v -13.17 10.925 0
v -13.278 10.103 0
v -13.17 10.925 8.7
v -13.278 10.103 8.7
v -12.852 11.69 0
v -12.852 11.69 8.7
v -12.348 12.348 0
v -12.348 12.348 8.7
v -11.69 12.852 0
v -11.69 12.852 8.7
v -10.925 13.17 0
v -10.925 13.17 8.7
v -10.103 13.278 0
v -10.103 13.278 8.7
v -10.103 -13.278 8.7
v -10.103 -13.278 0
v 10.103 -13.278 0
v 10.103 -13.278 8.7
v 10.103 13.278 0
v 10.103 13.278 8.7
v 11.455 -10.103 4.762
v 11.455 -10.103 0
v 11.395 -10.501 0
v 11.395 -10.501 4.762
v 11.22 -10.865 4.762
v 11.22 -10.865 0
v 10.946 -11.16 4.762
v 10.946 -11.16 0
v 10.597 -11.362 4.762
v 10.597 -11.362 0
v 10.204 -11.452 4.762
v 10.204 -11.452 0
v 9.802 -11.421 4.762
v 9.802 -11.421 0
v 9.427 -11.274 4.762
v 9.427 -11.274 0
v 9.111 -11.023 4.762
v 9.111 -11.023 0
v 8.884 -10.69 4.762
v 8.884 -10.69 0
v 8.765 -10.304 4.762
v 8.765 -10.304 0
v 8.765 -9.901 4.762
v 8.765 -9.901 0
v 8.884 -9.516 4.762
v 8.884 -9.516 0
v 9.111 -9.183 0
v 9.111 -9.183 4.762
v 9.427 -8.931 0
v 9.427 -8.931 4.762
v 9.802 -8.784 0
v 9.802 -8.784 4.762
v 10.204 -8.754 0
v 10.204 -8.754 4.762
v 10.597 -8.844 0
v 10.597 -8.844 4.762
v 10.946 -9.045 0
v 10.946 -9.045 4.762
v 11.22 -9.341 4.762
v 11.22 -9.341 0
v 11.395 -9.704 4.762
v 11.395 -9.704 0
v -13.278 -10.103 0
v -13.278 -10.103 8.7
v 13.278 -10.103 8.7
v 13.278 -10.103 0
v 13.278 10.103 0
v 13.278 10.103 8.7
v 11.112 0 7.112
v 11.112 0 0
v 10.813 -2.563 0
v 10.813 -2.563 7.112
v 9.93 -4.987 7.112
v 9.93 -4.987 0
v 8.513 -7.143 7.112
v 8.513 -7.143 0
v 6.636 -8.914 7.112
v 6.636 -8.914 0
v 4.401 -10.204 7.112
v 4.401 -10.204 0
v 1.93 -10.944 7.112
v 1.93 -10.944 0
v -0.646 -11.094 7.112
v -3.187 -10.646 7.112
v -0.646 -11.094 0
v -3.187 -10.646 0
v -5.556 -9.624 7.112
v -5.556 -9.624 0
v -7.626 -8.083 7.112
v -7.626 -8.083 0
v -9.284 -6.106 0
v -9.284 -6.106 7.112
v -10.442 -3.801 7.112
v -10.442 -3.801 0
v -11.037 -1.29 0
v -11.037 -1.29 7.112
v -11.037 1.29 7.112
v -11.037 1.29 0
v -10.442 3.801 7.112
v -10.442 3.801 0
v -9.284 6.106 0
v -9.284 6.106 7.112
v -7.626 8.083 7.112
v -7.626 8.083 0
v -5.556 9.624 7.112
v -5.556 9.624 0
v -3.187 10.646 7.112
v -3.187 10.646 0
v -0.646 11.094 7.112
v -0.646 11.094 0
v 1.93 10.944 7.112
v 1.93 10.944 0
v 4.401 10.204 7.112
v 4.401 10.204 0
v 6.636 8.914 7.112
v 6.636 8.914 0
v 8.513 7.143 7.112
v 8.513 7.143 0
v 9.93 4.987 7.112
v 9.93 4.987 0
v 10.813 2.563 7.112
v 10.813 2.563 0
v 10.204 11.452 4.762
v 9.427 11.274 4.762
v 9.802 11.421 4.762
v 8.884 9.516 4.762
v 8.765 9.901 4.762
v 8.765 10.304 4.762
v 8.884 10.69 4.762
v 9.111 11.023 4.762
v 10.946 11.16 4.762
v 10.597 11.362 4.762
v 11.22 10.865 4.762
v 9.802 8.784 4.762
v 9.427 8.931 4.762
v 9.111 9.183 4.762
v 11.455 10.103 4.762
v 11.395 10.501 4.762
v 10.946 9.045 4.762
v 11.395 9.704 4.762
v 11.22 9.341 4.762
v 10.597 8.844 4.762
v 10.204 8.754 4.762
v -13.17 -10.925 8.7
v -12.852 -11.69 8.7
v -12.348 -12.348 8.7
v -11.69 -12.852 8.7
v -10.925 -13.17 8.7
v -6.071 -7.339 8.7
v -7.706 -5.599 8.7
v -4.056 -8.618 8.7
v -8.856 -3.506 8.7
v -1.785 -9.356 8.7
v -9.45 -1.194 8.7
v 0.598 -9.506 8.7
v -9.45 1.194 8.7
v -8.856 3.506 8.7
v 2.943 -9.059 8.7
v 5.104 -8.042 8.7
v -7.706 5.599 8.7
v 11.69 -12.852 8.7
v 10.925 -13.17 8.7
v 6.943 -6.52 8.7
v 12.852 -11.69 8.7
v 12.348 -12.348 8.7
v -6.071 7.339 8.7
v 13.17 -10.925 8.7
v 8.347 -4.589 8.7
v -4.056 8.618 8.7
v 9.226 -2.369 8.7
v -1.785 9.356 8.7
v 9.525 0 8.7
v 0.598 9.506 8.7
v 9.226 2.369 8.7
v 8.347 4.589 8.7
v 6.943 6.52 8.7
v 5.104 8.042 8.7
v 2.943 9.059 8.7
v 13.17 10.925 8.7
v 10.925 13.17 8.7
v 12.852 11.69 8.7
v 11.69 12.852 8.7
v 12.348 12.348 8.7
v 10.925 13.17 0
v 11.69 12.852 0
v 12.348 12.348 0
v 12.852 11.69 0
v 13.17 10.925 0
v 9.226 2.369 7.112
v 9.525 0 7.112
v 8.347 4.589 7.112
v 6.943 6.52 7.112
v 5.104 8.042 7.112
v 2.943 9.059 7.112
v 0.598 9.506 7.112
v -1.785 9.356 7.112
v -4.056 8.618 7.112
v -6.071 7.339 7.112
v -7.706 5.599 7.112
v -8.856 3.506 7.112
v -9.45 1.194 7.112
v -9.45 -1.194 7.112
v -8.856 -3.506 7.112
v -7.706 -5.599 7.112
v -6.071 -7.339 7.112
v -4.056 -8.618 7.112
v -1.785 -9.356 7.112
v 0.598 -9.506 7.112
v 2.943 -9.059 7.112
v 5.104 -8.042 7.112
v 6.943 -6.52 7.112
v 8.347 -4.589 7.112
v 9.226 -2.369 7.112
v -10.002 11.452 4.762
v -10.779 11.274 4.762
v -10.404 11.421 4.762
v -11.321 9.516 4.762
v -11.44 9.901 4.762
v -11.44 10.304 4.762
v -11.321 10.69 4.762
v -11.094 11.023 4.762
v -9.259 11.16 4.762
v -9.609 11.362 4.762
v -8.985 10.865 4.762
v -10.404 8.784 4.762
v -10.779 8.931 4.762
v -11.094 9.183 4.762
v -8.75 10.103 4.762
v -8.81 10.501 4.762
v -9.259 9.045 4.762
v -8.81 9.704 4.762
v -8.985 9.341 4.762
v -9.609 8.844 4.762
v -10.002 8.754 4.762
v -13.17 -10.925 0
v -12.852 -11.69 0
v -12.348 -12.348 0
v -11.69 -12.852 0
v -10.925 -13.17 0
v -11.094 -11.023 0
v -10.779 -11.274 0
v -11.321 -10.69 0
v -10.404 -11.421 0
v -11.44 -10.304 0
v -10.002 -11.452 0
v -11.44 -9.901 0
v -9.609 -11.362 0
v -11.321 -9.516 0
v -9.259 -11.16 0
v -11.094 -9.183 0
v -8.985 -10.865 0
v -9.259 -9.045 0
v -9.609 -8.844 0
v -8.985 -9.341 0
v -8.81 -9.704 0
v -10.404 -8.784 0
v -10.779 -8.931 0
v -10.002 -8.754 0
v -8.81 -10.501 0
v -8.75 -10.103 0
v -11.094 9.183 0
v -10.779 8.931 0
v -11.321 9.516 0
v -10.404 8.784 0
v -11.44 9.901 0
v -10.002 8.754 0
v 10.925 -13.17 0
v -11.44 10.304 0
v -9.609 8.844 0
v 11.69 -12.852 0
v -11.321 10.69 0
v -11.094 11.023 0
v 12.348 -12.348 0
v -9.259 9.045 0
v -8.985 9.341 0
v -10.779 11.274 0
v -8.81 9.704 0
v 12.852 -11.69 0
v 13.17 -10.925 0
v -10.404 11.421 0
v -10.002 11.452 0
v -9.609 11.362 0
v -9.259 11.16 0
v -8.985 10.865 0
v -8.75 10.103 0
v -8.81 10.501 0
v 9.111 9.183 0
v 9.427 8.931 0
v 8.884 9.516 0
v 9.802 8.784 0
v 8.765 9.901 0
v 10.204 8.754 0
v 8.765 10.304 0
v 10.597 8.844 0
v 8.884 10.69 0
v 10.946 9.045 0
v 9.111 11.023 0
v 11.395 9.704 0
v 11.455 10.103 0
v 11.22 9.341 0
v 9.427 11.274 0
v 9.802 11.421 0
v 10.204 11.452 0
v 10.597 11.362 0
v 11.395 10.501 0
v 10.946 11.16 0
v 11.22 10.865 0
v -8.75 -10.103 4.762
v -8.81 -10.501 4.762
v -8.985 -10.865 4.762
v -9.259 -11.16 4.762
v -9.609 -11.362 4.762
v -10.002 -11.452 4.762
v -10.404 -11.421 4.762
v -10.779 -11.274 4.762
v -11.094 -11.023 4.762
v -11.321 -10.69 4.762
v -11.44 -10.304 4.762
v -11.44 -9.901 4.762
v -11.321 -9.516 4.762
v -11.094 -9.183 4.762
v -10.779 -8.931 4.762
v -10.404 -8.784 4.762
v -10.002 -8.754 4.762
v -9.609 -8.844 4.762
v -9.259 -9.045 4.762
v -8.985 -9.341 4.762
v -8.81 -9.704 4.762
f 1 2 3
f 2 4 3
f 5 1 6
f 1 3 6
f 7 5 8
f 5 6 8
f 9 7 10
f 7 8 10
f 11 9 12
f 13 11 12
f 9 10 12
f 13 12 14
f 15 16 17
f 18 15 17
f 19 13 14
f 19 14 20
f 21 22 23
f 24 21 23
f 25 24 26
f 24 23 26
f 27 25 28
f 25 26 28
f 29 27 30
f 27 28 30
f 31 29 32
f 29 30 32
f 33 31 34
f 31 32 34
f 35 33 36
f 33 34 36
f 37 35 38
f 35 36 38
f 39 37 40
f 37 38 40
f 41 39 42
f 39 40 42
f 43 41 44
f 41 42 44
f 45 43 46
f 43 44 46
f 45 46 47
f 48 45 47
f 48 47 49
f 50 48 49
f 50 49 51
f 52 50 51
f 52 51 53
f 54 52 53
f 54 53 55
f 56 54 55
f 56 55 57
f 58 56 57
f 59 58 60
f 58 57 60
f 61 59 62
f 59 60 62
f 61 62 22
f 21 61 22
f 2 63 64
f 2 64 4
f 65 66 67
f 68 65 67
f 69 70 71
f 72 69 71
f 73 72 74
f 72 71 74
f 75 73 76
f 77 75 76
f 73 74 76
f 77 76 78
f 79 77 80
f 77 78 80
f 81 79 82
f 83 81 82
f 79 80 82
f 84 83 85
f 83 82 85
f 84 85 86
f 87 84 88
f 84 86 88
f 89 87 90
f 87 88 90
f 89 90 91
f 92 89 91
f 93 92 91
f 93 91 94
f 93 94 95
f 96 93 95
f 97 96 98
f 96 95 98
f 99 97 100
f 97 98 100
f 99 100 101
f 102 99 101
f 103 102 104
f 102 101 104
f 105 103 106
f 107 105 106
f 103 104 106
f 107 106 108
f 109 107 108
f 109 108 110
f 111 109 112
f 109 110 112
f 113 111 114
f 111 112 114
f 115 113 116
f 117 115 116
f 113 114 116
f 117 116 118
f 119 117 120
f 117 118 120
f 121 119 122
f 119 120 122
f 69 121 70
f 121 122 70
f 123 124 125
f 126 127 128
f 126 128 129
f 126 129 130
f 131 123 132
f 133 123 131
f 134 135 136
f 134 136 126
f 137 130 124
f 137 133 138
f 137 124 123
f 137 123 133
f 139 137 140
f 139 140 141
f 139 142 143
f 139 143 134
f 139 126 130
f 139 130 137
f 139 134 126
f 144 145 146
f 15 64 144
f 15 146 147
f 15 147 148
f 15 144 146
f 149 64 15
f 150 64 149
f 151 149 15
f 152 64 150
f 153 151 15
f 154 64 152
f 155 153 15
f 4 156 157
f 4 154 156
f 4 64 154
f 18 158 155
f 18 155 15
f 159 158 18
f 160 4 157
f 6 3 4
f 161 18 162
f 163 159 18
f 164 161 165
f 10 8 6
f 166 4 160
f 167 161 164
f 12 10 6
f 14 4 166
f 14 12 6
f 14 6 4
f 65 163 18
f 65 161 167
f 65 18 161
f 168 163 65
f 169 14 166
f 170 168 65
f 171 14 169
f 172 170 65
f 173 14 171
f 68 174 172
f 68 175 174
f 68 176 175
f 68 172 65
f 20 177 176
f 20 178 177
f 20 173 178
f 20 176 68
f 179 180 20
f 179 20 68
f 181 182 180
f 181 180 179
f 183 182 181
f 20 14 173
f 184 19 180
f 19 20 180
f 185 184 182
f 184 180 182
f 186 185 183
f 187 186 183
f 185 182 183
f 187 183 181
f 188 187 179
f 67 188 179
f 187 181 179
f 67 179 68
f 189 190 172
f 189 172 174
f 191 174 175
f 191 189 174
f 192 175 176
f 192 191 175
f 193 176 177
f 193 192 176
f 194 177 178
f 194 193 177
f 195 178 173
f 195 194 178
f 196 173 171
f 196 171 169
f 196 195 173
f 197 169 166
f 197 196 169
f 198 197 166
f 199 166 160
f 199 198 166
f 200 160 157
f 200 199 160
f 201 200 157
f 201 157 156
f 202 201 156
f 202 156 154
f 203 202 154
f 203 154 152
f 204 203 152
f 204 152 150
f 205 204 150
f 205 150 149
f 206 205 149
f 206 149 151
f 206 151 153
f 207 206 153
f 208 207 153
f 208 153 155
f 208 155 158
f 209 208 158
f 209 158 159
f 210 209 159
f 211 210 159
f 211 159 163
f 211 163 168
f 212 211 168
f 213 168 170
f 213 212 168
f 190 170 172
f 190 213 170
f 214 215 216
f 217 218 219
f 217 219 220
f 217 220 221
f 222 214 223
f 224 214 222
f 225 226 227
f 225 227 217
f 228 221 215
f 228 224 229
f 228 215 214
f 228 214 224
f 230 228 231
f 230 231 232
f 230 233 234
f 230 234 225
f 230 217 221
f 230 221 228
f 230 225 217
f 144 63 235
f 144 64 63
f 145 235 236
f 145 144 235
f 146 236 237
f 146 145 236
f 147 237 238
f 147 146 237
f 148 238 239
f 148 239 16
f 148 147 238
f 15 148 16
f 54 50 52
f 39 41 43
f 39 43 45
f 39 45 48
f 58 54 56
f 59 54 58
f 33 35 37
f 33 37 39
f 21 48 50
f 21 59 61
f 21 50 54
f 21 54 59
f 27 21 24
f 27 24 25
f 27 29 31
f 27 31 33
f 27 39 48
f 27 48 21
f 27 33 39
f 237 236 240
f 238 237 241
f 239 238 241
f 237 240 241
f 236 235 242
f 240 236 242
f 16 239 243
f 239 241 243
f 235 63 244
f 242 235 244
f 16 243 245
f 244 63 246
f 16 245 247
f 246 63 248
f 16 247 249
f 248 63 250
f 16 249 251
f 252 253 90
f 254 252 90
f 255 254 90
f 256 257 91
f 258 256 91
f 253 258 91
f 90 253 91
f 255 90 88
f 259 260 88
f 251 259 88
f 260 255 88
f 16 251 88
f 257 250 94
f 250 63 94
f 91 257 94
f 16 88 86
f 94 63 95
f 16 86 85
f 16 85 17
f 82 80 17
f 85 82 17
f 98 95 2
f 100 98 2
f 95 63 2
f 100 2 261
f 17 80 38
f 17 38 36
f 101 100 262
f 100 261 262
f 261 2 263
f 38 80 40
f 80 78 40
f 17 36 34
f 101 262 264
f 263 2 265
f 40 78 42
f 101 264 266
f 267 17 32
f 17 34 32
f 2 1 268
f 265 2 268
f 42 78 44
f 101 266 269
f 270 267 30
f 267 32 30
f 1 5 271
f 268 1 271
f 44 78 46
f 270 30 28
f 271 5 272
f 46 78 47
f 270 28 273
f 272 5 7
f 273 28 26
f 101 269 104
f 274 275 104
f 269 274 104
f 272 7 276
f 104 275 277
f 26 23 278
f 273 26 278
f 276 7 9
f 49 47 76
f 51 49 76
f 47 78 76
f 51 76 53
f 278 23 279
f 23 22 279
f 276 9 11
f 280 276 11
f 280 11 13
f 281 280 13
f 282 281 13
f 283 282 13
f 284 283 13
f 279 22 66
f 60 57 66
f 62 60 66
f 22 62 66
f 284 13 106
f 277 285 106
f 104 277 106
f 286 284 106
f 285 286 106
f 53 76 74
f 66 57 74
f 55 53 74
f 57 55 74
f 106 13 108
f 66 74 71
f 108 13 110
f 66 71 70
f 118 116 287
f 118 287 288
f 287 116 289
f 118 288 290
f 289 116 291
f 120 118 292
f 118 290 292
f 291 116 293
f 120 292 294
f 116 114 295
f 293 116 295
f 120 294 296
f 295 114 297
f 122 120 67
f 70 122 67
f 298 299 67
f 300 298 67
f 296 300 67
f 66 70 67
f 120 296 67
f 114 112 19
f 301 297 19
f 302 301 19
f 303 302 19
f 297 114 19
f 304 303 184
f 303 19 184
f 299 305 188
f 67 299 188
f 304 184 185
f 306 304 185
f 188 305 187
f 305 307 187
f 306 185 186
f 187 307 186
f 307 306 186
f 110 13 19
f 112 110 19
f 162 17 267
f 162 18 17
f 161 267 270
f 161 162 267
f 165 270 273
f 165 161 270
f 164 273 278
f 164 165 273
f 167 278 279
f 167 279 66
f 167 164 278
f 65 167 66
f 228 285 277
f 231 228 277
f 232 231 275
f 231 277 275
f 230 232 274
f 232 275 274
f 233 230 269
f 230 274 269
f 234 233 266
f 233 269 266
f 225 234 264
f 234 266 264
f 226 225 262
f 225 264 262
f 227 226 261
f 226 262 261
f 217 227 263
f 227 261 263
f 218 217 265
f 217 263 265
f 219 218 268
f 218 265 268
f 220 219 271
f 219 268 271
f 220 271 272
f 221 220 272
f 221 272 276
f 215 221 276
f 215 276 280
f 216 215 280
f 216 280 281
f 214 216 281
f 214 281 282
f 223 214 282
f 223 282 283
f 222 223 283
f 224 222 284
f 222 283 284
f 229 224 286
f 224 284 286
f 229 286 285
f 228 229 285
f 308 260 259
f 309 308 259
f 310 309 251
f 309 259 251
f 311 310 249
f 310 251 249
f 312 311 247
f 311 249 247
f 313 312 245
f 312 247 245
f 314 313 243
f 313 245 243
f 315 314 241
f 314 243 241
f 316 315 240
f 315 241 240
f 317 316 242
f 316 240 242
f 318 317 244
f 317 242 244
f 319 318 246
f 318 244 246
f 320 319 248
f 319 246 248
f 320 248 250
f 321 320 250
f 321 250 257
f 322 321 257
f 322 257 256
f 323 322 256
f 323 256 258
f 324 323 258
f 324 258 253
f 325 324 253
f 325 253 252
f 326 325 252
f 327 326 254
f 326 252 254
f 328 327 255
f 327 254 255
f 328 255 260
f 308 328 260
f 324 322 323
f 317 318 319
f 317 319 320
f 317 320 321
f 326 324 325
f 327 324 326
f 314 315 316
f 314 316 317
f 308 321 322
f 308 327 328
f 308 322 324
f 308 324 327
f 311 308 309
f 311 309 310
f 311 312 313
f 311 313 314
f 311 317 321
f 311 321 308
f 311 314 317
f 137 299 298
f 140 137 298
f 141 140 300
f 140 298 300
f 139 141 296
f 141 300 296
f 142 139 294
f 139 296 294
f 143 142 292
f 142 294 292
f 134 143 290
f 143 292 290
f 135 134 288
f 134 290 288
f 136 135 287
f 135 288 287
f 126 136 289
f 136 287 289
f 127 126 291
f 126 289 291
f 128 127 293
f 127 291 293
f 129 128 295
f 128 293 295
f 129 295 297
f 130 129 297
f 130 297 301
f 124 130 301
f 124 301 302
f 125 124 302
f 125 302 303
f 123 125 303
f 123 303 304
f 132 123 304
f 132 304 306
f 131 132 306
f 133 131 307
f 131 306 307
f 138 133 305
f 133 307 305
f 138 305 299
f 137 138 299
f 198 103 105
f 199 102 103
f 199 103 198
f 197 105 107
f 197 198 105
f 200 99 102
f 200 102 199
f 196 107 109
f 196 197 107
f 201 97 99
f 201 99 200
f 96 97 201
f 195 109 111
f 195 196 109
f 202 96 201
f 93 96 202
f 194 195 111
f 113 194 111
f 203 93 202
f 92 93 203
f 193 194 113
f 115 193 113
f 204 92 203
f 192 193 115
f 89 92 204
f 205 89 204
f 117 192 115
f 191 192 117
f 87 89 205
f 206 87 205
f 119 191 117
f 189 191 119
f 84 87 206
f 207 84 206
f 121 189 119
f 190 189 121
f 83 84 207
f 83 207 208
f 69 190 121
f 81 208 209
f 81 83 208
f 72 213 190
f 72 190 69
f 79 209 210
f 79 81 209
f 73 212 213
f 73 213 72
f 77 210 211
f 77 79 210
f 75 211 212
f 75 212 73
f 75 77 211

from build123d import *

# Parameters (mm, degrees)
F0_W     = 26.555576
F0_H     = 26.555576
F0_R     = 9.525
F1_DEPTH = 8.6995
F2_R     = 3.175
F3_R     = 11.1125
F4_DEPTH = 7.112
F5_R     = 1.35255
F6_DEPTH = 4.7625


with BuildPart() as f1:
    # F0 (on Top) → F1 (new body)
    with BuildSketch(Plane.XY):
        Rectangle(F0_W, F0_H)
        Circle(F0_R, mode=Mode.SUBTRACT)
    extrude(amount=F1_DEPTH)

    # F2
    f2_edges = [f1.edges().sort_by_distance(p)[0] for p in [
        (-13.277788, 13.277788, 4.34975),
        (-13.277788, -13.277788, 4.34975),
        (13.277788, -13.277788, 4.34975),
        (13.277788, 13.277788, 4.34975),
    ]]
    fillet(f2_edges, radius=F2_R)

    # F3 (on face) → F4 (cut)
    with BuildSketch(Plane(origin=(0, 0, 0), x_dir=(1, 0, 0), z_dir=(0, 0, -1))):
        Circle(F3_R)
    extrude(amount=-F4_DEPTH, mode=Mode.SUBTRACT)

    # F5 (on face) → F6 (cut)
    with BuildSketch(Plane(origin=(0, 0, 0), x_dir=(1, 0, 0), z_dir=(0, 0, -1))):
        with Locations((10.102788, 10.102788)):
            Circle(F5_R)
        with Locations((-10.102788, 10.102788)):
            Circle(F5_R)
        with Locations((-10.102788, -10.102788)):
            Circle(F5_R)
        with Locations((10.102788, -10.102788)):
            Circle(F5_R)
    extrude(amount=-F6_DEPTH, mode=Mode.SUBTRACT)


solid = f1.part
